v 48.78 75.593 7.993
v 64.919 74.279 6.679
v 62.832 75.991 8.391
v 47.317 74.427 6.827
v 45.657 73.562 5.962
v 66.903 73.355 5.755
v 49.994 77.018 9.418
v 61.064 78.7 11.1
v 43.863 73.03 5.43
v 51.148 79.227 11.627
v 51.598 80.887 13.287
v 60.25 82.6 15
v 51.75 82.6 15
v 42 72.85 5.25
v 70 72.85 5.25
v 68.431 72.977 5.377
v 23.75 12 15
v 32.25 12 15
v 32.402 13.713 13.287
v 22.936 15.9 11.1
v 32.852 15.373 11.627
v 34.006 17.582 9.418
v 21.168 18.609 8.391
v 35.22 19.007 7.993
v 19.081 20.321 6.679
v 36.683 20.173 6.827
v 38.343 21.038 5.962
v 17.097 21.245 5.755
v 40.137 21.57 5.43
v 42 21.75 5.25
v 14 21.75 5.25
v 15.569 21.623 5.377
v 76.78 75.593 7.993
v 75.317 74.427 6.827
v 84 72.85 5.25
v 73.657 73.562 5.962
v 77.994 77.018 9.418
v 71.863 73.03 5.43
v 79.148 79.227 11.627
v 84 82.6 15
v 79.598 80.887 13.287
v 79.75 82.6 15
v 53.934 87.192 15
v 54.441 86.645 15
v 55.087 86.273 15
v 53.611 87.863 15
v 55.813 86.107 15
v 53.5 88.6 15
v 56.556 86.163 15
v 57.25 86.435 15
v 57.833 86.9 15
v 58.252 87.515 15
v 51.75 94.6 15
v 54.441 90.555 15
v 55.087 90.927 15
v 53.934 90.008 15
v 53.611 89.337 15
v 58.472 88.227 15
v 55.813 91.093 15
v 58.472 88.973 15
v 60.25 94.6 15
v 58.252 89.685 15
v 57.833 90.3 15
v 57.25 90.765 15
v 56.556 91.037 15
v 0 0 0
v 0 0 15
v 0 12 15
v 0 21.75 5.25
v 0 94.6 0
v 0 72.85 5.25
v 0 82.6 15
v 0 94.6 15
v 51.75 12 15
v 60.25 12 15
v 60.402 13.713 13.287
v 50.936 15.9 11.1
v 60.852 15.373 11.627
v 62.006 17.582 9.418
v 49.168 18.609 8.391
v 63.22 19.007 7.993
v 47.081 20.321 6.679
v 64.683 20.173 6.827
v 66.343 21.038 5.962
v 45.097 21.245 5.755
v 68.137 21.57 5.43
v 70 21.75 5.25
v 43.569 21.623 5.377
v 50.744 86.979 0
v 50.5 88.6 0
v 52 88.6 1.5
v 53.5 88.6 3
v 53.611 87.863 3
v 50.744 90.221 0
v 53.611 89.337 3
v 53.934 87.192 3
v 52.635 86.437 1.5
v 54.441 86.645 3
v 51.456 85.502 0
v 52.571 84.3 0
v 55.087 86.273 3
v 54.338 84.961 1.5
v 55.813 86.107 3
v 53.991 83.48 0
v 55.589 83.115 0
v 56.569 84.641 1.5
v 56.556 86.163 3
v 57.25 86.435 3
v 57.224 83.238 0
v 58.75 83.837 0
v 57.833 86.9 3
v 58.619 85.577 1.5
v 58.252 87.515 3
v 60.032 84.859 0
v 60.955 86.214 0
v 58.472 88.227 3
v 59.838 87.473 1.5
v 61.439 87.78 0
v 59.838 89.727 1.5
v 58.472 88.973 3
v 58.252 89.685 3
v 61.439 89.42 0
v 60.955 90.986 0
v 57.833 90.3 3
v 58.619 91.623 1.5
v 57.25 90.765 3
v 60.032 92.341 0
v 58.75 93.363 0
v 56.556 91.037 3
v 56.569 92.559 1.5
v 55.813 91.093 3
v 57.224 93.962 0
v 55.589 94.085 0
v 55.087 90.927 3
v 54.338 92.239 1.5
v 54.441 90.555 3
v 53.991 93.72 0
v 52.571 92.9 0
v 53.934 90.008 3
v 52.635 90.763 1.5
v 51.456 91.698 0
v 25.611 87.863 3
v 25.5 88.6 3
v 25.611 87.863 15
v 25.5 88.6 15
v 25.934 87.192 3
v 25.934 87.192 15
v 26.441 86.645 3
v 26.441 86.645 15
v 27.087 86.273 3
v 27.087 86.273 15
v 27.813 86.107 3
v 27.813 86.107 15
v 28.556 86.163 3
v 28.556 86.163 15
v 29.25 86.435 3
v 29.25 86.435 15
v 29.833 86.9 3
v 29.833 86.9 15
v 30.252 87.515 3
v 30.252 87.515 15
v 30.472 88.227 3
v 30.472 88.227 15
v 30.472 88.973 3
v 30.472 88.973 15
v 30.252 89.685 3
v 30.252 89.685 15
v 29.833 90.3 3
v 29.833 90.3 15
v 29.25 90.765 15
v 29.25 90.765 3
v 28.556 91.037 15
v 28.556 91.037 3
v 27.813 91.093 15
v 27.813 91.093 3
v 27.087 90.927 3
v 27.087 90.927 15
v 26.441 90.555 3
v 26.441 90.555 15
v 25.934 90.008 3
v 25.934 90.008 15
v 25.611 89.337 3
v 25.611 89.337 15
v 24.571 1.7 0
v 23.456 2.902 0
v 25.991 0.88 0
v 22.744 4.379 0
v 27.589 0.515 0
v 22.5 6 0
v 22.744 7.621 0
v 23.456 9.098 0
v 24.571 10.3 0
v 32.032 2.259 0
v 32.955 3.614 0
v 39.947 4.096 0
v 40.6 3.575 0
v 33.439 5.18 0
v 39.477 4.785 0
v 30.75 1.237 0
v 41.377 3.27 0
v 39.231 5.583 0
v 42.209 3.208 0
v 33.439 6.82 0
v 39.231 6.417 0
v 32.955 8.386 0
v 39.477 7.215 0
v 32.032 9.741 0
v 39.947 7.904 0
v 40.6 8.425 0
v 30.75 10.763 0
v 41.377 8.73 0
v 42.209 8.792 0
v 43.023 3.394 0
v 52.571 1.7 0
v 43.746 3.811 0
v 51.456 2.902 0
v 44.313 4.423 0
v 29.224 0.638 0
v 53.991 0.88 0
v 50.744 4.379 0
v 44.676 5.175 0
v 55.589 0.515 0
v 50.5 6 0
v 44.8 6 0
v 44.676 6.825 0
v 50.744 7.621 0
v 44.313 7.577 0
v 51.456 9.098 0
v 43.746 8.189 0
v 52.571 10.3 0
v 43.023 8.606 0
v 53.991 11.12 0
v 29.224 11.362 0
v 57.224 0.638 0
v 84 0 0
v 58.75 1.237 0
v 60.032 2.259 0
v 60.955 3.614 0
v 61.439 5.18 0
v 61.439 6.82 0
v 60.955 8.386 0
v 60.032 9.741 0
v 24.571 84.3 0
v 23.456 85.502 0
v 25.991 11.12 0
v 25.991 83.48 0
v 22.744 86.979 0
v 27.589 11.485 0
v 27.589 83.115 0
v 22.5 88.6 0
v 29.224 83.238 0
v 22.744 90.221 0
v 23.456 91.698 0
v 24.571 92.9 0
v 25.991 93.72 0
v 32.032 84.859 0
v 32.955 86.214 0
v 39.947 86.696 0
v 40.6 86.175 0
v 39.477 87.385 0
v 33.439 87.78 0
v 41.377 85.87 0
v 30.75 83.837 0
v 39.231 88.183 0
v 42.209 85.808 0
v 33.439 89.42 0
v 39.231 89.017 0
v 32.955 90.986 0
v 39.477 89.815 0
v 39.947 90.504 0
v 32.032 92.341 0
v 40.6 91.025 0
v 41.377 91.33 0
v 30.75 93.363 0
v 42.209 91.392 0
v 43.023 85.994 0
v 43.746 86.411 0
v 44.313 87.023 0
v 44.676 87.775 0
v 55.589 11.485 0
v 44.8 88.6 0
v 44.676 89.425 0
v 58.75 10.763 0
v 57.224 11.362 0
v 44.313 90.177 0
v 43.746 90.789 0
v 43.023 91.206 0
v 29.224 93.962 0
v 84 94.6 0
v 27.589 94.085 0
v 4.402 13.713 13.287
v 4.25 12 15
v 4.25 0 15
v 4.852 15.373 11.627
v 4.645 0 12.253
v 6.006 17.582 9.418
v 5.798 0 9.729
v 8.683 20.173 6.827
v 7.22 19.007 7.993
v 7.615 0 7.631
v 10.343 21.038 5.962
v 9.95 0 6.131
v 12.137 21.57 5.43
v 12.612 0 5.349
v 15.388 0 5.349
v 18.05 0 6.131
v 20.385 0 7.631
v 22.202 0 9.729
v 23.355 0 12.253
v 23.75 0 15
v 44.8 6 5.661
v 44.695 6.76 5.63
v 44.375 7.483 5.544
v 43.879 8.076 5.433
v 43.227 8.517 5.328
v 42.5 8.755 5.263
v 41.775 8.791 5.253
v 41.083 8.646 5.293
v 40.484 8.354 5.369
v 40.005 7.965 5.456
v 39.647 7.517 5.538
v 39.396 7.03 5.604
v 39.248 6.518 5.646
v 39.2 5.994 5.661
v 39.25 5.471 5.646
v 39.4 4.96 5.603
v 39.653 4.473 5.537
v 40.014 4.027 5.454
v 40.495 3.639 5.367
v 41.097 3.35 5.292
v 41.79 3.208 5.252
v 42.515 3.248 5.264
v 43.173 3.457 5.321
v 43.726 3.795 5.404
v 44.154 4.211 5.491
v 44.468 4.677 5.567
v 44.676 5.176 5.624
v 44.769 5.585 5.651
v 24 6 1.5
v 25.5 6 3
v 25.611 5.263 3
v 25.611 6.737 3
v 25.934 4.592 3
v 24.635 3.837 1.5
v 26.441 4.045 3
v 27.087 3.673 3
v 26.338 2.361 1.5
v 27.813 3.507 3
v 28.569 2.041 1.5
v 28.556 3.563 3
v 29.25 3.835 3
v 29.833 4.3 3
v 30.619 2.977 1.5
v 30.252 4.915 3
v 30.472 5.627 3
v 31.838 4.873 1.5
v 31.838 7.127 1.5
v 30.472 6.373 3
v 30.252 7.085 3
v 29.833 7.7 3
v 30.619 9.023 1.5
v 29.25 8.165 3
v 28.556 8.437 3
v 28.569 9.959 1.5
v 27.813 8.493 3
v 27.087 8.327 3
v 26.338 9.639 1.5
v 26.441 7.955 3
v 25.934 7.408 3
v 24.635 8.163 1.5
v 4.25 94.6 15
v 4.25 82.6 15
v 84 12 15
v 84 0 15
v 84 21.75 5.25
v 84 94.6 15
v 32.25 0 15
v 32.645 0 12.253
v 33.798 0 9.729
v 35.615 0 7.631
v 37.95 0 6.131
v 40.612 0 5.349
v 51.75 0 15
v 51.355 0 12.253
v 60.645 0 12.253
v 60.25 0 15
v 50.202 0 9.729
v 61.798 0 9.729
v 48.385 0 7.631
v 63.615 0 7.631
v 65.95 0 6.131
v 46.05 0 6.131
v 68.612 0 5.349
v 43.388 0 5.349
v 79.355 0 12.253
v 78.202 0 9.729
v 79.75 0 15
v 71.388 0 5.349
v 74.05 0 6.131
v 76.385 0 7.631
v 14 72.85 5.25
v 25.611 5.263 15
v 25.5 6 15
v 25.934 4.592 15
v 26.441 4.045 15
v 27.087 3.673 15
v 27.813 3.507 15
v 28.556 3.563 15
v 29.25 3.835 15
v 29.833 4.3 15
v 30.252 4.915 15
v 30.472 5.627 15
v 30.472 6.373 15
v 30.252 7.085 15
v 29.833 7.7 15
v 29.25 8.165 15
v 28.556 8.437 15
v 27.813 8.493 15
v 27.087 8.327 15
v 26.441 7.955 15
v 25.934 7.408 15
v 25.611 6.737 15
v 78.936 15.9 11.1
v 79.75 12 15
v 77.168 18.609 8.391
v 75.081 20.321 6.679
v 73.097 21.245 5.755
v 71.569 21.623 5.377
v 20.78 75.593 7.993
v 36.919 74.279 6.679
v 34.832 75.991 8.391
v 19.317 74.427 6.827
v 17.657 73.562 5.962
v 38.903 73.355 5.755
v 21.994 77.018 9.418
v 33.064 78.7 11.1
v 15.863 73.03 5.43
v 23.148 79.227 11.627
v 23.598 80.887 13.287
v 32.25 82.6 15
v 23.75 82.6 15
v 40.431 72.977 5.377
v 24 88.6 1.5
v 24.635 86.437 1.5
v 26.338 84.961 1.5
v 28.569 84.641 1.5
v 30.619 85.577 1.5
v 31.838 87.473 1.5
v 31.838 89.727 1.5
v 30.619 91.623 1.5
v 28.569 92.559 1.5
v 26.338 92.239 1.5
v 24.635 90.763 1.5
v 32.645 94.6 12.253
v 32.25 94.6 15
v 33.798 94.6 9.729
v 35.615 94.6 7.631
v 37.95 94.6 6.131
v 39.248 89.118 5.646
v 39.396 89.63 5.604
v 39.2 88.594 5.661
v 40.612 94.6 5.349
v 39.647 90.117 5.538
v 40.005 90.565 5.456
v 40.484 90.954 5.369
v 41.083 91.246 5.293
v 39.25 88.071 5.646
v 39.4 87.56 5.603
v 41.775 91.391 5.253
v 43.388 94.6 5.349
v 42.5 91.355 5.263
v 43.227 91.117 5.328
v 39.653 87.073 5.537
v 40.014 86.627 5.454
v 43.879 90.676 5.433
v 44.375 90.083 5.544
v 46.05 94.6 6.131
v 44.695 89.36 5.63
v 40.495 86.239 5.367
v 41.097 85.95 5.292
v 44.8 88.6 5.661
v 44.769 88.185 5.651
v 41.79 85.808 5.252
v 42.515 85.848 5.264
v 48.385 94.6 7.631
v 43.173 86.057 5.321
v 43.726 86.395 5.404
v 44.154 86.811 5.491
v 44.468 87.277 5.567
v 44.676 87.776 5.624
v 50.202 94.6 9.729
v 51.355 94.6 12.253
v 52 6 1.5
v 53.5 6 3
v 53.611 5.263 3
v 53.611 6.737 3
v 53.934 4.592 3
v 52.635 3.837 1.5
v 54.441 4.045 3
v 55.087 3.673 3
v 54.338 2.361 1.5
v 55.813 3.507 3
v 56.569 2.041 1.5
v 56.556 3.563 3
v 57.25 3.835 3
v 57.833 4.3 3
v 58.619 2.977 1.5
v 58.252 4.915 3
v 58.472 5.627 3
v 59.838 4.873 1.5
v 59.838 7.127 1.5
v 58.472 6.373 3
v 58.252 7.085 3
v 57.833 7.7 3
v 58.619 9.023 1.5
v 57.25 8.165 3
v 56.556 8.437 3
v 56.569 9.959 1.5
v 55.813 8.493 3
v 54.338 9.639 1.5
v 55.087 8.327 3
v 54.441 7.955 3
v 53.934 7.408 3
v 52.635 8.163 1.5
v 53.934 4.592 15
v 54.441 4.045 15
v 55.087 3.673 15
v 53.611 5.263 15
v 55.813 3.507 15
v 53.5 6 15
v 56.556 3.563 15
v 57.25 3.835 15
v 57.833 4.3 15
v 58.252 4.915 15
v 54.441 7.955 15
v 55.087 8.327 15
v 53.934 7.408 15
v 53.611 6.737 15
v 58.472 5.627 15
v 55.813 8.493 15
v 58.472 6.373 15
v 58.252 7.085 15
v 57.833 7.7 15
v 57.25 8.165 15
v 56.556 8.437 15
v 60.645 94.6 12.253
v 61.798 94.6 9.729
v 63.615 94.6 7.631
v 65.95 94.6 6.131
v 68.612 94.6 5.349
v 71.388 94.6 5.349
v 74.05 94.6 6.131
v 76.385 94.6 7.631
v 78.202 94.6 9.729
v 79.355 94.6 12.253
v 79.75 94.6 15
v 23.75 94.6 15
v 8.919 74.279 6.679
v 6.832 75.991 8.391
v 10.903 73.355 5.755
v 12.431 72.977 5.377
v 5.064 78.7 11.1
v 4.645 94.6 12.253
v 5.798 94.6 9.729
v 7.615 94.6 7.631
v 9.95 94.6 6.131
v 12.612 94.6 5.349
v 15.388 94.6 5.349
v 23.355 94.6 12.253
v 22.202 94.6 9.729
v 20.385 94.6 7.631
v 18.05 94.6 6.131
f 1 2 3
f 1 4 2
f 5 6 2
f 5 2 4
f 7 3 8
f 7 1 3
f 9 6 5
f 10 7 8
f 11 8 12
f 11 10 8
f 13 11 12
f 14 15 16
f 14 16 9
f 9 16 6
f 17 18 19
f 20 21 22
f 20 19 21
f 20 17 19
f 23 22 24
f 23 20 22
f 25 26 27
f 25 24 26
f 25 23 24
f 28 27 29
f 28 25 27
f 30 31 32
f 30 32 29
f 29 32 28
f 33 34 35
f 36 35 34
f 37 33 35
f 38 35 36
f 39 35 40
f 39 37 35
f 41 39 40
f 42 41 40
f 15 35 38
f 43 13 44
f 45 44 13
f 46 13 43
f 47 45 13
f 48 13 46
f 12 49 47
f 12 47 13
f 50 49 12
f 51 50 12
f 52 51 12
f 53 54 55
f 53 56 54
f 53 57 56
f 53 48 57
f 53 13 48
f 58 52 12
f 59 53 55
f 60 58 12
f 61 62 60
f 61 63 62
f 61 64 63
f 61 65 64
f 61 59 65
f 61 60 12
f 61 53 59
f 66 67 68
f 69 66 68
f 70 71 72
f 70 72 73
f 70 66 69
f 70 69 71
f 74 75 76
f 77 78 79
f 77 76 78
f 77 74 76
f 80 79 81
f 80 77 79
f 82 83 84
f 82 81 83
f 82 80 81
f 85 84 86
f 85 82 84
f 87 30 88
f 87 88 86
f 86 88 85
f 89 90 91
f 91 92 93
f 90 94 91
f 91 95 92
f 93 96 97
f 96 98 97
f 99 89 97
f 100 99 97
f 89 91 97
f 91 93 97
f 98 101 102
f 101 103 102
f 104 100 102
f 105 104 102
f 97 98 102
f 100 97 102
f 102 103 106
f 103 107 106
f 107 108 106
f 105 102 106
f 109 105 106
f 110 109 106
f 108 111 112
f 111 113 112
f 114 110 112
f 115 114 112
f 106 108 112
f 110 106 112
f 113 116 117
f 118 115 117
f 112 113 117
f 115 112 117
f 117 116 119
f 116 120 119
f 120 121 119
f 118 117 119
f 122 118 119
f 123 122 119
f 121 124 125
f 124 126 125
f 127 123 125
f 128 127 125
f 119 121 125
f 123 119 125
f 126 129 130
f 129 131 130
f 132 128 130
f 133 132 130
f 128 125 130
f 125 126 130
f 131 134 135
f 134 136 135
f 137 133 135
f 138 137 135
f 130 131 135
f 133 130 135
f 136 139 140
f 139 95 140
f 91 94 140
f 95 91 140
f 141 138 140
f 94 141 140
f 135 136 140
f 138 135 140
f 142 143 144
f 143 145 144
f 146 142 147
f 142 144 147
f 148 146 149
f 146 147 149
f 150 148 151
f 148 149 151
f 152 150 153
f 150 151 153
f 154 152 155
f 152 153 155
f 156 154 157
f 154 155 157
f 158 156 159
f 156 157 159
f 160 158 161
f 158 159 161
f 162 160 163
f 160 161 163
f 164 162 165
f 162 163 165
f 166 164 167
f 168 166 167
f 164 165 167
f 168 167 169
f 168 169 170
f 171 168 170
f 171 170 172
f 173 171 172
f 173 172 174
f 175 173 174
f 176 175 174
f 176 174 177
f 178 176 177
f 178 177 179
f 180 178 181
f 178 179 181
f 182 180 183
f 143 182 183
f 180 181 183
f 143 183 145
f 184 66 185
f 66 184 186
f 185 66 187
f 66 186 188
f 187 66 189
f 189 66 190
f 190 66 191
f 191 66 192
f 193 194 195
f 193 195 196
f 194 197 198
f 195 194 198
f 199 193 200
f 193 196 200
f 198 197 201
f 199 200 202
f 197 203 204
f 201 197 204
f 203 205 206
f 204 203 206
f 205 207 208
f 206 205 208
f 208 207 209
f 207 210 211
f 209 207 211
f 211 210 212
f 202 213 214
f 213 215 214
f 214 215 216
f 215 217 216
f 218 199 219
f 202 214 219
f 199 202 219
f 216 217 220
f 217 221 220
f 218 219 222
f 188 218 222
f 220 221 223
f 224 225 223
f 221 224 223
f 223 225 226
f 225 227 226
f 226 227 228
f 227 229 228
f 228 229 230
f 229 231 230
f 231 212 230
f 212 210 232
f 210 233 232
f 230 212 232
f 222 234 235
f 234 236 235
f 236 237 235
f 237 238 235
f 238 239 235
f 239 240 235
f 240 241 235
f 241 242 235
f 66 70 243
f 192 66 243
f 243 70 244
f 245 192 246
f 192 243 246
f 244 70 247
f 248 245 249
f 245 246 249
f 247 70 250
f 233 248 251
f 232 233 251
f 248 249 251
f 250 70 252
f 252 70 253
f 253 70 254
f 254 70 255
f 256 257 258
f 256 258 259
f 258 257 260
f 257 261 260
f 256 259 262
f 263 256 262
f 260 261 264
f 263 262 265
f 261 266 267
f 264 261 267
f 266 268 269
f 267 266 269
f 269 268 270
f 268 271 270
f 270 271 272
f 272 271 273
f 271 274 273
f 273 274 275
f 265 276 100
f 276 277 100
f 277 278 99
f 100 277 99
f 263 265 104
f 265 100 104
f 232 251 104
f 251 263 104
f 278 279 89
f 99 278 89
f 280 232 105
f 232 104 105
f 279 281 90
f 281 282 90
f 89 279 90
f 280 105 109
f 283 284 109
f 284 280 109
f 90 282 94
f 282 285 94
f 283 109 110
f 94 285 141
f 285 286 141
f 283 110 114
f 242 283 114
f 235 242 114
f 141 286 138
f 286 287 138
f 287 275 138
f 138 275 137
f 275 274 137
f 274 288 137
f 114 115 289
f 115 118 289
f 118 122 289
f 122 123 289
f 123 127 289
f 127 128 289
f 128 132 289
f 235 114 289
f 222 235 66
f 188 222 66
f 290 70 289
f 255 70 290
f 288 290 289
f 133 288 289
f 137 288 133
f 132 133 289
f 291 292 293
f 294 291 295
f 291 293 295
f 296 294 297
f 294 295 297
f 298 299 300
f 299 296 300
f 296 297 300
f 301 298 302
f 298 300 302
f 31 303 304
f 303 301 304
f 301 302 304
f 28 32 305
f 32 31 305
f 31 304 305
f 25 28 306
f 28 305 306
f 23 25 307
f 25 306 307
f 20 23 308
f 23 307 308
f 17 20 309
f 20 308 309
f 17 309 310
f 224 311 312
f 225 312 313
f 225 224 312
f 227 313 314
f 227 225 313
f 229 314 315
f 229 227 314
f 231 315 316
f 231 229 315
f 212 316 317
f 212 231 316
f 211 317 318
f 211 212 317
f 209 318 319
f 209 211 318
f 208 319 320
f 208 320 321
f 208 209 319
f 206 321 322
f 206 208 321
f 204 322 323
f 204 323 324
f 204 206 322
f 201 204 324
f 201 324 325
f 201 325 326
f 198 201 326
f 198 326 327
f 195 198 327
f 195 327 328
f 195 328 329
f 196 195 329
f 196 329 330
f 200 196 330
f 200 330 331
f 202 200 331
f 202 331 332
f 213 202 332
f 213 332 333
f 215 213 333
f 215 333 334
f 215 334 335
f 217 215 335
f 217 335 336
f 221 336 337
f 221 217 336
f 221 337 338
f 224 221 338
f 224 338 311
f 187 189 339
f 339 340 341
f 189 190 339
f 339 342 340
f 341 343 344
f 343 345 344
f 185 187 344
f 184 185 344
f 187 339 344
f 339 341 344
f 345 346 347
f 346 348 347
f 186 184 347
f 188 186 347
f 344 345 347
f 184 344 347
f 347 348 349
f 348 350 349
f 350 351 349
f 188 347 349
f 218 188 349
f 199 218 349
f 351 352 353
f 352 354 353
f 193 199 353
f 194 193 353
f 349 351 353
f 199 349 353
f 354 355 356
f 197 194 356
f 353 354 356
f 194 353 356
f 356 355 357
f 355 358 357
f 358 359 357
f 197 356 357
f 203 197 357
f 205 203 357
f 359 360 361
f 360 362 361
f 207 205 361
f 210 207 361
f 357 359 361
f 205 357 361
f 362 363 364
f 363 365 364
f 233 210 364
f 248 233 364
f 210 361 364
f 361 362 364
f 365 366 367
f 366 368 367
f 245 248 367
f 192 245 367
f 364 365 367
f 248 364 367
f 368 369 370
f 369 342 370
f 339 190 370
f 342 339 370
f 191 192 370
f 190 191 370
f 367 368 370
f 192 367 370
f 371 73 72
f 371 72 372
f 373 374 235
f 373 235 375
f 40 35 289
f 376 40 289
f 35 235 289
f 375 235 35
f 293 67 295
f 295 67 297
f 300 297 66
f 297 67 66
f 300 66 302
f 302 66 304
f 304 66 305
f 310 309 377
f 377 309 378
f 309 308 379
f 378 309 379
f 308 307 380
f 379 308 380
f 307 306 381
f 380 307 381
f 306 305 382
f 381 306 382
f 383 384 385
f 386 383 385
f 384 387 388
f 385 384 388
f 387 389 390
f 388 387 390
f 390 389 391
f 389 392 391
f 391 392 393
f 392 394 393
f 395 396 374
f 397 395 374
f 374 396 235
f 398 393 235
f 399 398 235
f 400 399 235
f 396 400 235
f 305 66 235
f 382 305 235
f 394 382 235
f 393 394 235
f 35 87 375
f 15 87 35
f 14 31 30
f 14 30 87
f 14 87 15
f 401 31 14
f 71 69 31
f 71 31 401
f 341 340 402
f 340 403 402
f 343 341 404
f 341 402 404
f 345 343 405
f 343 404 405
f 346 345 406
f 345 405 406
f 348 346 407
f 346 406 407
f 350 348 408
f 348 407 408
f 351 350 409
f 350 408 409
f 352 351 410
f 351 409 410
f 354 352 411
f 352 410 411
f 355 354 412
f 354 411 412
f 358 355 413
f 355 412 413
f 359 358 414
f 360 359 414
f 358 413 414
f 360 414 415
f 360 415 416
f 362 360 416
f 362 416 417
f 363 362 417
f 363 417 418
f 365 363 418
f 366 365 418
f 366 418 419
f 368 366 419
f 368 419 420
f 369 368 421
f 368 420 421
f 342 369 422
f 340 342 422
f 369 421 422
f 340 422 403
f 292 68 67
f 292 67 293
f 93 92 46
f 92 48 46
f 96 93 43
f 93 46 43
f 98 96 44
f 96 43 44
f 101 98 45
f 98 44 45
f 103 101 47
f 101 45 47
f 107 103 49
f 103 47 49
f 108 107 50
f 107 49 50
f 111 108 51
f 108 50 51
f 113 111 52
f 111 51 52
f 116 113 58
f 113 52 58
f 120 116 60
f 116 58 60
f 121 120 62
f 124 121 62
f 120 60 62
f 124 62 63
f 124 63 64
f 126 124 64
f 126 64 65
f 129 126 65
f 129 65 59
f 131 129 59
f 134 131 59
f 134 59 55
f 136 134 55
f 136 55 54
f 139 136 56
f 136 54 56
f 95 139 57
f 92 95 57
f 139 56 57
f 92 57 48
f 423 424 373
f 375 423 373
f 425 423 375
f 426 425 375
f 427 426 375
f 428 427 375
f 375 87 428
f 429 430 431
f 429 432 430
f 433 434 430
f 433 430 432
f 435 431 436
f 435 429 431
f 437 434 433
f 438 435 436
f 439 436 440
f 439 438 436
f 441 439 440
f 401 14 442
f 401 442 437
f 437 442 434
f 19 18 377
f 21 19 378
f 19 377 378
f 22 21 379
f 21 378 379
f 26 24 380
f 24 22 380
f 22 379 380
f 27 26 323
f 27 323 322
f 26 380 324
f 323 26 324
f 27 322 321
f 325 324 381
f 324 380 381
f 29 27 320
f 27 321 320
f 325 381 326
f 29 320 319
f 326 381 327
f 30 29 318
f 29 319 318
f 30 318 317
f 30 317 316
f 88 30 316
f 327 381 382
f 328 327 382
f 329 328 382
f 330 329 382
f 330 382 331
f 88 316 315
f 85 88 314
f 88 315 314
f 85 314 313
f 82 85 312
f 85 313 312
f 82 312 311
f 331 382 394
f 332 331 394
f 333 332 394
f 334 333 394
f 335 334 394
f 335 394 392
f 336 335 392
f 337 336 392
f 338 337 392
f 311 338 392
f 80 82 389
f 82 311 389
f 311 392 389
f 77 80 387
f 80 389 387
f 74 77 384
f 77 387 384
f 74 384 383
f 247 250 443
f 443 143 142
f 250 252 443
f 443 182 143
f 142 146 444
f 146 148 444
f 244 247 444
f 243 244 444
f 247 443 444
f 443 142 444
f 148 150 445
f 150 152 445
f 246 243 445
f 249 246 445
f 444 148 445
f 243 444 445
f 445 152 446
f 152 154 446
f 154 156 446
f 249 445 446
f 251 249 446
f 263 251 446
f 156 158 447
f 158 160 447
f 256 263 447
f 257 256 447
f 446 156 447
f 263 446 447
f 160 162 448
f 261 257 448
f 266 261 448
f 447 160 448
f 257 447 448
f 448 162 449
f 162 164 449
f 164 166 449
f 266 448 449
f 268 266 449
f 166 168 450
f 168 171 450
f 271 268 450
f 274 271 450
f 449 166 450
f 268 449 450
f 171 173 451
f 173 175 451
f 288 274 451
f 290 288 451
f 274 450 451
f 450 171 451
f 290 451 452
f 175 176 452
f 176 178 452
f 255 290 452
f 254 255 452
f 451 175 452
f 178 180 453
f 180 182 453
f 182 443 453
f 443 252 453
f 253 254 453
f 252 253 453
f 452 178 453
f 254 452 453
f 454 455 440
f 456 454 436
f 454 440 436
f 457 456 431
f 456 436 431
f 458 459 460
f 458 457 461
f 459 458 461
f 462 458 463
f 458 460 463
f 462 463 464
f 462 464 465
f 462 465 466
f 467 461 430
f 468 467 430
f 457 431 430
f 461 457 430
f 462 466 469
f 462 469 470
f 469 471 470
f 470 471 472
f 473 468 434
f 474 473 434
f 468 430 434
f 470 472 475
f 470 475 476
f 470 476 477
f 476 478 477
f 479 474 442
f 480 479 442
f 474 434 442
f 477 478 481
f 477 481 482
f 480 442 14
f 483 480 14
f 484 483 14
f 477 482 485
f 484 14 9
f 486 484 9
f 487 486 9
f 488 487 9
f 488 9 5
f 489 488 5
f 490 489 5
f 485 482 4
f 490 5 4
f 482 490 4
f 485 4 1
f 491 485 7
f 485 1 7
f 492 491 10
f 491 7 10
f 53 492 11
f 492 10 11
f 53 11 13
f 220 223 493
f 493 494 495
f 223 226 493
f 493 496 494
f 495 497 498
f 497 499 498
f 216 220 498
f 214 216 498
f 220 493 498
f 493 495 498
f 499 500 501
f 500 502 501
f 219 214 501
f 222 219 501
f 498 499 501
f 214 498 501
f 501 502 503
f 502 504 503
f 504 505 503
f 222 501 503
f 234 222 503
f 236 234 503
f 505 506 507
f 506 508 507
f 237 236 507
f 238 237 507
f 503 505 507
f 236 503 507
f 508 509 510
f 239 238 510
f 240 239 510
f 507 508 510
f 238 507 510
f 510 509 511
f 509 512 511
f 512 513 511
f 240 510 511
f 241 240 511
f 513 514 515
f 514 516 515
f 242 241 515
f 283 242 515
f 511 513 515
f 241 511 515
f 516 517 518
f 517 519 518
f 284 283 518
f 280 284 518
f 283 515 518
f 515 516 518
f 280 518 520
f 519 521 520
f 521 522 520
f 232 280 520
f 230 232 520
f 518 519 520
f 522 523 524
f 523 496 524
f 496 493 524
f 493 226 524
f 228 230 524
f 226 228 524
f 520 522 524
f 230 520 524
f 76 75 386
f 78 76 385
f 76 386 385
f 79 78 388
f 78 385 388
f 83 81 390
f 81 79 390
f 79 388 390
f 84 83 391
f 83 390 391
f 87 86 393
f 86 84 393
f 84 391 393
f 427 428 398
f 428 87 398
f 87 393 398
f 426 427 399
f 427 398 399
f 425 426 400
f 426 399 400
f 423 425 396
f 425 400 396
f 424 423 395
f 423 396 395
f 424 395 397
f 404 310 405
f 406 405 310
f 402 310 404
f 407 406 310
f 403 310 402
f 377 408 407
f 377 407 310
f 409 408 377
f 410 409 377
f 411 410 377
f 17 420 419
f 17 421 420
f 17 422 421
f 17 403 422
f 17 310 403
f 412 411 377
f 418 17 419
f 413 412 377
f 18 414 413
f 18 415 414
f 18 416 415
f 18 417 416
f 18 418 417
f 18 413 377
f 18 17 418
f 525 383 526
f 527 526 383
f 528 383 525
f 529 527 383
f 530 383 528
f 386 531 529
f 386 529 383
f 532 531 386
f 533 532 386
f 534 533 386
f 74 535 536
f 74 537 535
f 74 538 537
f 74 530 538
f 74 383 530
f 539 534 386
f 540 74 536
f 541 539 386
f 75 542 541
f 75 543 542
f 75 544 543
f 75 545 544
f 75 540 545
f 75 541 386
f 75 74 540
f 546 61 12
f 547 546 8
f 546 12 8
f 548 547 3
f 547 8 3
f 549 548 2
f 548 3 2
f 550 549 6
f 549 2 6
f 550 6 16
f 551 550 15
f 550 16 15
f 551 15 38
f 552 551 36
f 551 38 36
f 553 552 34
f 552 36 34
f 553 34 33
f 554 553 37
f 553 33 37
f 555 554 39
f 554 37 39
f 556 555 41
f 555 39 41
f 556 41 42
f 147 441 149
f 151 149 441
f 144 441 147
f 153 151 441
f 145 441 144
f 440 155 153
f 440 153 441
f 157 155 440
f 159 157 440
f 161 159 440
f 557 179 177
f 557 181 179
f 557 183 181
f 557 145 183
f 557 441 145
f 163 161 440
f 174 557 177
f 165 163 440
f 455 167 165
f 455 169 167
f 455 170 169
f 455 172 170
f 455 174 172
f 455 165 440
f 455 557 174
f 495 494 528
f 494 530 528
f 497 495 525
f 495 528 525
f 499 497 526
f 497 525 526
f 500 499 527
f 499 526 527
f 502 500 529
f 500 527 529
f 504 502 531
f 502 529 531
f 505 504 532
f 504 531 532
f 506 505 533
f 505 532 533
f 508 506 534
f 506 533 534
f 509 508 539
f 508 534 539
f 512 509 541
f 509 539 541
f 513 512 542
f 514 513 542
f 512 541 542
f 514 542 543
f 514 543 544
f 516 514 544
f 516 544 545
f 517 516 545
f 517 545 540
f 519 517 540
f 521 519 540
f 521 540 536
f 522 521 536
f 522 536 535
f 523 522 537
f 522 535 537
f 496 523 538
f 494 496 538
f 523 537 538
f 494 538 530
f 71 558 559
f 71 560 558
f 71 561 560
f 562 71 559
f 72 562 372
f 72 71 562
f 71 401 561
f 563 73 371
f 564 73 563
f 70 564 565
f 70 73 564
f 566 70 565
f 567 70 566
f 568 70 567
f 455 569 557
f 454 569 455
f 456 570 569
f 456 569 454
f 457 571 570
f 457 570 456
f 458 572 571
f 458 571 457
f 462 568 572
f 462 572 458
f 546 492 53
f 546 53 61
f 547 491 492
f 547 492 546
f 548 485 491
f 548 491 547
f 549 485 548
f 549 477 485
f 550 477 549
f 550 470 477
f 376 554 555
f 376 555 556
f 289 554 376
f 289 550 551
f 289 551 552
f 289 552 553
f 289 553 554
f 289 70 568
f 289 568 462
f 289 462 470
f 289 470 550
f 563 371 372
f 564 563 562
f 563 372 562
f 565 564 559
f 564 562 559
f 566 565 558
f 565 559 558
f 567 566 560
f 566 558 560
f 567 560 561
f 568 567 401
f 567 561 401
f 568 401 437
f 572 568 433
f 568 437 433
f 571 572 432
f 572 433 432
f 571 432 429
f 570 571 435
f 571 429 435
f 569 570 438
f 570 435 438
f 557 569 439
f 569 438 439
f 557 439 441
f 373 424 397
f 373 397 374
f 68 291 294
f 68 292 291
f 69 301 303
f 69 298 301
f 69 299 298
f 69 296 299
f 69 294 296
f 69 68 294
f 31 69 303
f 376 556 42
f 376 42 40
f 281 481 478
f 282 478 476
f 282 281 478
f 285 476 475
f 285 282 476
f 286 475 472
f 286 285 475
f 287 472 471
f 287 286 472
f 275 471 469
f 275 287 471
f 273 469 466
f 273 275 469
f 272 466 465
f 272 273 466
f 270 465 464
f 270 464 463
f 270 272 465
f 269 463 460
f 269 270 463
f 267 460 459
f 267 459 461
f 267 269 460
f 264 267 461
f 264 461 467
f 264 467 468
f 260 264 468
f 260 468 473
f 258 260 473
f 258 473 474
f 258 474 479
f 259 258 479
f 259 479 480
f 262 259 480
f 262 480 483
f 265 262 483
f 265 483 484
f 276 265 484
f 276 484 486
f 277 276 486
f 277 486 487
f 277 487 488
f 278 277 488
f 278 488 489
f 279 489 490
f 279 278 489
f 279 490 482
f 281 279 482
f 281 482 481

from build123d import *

# Parameters (mm, degrees)
SKETCH_W            = 84
SKETCH_H            = 94.6
PAD_DEPTH           = 15
SKETCH001_R         = 9.75
POCKET_DEPTH        = 94.601
LINEARPATTERN_COUNT = 3
LINEARPATTERN_PITCH = 28
HOLE_D              = 5
HOLE_DEPTH          = 25
HOLE_CSINK_D        = 11
HOLE_CSINK_ANGLE    = 90
SKETCH003_R         = 2.8
POCKET001_DEPTH     = 15.001
POCKET002_DEPTH     = 84.001


with BuildPart() as part:
    # Sketch → Pad (new body)
    with BuildSketch(Plane.XY):
        with Locations((42, 47.3)):
            Rectangle(SKETCH_W, SKETCH_H)
    extrude(amount=PAD_DEPTH)

    # Sketch001 (on DatumPlane) → Pocket (cut, through all)
    with BuildSketch(Plane.XZ):
        with Locations((14, 15)):
            Circle(SKETCH001_R)
    pocket = extrude(amount=-POCKET_DEPTH, mode=Mode.SUBTRACT)

    # LinearPattern: Pocket ×3
    with Locations(*[(i * LINEARPATTERN_PITCH, 0, 0) for i in range(1, LINEARPATTERN_COUNT)]):
        add(pocket, mode=Mode.SUBTRACT)

    # Hole
    with Locations(Plane(origin=(0, 0, 0), x_dir=(1, 0, 0), z_dir=(0, 0, -1))):
        with Locations((28, -6), (56, -6), (28, -88.6), (56, -88.6)):
            CounterSinkHole(HOLE_D / 2, HOLE_CSINK_D / 2, depth=HOLE_DEPTH, counter_sink_angle=HOLE_CSINK_ANGLE)

    # Sketch003 → Pocket001 (cut, through all)
    with BuildSketch(Plane.XY):
        with Locations((42, 88.6)):
            Circle(SKETCH003_R)
        with Locations((42, 6)):
            Circle(SKETCH003_R)
    extrude(amount=POCKET001_DEPTH, mode=Mode.SUBTRACT)

    # Sketch004 (on DatumPlane) → Pocket002 (cut, through all)
    with BuildSketch(Plane.YZ):
        Polygon((82.6, 15), (12, 15), (21.75, 5.25), (72.85, 5.25), align=None)
    extrude(amount=POCKET002_DEPTH, mode=Mode.SUBTRACT)


solid = part.part
